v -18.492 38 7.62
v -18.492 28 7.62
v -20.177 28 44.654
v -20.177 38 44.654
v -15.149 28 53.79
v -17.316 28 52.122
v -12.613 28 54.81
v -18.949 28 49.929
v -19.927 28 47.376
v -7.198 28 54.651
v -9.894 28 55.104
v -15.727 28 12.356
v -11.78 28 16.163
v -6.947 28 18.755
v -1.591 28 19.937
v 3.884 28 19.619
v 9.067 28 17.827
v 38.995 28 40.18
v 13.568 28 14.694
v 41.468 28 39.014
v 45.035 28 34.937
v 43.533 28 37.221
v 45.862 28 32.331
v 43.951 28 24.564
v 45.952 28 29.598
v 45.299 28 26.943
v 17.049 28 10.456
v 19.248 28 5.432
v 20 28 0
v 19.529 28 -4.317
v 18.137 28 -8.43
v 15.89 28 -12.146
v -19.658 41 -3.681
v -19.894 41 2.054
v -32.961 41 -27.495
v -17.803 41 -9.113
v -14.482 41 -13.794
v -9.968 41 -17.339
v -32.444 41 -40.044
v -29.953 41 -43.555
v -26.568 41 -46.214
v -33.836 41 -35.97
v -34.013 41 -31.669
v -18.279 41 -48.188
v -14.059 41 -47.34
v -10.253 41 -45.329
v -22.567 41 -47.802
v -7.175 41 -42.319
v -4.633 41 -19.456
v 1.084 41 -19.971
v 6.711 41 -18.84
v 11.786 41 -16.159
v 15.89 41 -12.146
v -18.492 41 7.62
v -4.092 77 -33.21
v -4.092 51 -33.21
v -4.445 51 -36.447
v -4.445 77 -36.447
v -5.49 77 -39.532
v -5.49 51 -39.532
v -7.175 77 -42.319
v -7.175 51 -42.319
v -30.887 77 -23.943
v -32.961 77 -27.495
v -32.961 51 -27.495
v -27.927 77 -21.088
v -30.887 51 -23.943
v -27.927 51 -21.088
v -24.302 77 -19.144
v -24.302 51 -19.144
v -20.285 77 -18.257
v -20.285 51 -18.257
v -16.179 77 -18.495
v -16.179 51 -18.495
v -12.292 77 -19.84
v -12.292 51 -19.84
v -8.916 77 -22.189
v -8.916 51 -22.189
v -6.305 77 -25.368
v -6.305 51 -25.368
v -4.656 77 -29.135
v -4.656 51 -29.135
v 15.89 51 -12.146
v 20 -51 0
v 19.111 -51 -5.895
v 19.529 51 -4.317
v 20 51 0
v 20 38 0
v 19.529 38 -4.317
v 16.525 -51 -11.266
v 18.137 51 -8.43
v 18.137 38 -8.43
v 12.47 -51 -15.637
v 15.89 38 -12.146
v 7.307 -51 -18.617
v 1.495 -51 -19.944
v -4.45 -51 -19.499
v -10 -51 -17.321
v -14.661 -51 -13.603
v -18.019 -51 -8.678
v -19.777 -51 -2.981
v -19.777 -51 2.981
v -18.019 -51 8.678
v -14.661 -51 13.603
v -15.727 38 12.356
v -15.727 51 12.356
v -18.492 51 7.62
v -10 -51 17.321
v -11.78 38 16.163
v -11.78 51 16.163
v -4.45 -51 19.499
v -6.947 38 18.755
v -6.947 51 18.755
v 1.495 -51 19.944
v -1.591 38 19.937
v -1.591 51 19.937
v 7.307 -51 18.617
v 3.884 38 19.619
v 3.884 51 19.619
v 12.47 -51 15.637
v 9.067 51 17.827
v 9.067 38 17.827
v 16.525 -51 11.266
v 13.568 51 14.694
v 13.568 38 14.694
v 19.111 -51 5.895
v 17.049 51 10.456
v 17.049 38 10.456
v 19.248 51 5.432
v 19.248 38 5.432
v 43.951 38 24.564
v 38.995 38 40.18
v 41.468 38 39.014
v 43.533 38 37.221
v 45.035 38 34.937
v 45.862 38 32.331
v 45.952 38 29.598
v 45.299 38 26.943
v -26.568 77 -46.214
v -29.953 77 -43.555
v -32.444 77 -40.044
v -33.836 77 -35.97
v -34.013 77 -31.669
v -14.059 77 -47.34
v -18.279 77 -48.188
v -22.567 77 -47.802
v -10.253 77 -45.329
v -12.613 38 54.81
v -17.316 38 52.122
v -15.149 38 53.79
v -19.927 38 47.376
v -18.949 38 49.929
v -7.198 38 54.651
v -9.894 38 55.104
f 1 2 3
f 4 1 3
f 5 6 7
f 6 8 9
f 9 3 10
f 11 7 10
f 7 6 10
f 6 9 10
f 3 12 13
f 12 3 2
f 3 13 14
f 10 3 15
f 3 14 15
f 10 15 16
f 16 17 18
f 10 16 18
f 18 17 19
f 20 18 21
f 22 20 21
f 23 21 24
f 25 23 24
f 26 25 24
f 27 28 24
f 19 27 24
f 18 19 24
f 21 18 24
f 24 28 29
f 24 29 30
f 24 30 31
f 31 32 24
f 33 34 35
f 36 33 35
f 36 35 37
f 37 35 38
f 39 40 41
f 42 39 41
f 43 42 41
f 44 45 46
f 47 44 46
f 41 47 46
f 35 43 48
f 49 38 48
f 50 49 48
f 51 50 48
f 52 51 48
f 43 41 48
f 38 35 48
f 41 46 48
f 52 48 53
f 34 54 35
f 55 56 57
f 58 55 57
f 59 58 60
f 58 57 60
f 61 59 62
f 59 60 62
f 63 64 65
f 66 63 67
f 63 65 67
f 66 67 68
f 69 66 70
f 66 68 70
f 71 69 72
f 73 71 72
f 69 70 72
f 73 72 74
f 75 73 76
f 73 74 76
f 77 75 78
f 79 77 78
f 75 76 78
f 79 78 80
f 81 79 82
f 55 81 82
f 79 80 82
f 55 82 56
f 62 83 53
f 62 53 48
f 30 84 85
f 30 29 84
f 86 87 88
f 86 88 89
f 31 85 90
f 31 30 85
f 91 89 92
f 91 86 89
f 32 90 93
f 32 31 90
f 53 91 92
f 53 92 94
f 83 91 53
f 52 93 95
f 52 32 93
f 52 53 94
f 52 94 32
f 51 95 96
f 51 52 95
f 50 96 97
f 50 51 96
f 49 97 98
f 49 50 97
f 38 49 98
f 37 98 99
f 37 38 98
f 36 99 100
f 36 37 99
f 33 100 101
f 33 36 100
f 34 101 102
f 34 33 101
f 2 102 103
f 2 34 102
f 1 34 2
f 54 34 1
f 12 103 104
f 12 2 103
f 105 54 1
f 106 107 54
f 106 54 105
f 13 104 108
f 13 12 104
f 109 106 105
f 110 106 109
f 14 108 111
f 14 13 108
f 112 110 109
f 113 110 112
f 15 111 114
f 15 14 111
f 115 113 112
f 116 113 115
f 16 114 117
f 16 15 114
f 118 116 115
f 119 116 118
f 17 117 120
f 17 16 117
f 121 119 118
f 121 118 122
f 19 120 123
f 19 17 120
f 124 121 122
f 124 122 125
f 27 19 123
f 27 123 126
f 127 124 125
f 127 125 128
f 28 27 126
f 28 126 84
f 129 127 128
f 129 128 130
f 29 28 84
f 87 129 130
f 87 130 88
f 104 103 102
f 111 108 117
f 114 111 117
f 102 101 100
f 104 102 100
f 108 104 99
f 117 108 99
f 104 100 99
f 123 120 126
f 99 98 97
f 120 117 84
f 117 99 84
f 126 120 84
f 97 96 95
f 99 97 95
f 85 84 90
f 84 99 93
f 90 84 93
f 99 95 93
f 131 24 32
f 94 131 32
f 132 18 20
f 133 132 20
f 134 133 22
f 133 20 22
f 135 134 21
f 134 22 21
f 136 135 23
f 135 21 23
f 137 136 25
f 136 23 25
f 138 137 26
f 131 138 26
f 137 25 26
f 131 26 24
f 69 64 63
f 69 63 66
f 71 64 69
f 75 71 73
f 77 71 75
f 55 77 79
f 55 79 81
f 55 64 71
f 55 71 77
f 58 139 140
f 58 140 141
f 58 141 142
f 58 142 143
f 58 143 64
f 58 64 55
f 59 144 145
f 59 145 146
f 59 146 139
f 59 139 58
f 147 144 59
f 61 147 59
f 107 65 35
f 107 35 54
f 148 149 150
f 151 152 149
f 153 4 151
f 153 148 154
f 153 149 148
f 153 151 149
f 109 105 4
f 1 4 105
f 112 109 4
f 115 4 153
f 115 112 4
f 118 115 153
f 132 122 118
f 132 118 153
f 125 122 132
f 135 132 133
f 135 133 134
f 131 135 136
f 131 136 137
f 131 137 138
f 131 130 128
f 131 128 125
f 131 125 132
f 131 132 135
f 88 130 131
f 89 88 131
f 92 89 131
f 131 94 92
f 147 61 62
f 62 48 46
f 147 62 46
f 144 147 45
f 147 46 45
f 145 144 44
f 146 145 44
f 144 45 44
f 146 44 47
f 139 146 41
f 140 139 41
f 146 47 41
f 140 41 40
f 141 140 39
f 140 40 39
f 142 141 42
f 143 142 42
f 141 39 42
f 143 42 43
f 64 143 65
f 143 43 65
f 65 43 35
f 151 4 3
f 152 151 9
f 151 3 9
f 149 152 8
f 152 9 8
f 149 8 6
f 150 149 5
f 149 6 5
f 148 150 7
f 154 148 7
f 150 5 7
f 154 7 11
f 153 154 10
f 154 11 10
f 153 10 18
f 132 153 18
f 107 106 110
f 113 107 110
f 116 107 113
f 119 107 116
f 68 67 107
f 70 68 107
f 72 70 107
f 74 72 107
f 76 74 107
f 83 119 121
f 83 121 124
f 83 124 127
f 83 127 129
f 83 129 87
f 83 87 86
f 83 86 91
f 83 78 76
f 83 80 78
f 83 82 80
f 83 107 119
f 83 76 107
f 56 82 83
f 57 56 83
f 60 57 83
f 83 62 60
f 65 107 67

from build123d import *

# Parameters (mm, degrees)
SKETCH1_R           = 20
BOSS_EXTRUDE1_DEPTH = 51
BOSS_EXTRUDE2_DEPTH = 10
BOSS_EXTRUDE3_START = 26
BOSS_EXTRUDE3_DEPTH = 26
BOSS_EXTRUDE4_START = -10
BOSS_EXTRUDE4_DEPTH = 10


with BuildPart() as part:
    # Sketch1 → Boss-Extrude1 (new, symmetric)
    with BuildSketch(Plane(origin=(0, 0, 0), x_dir=(1, 0, 0), z_dir=(0, 1, 0))):
        Circle(SKETCH1_R)
    extrude(amount=BOSS_EXTRUDE1_DEPTH, both=True)

    # Sketch2 → Boss-Extrude2 (add)
    with BuildSketch(Plane(origin=(0, 51, 0), x_dir=(1, 0, 0), z_dir=(0, 1, 0))):
        with BuildLine():
            Line((15.889530325, 12.145897498), (-7.174782394, 42.319138828))
            ThreePointArc((-7.174782394, 42.319138828), (-26.567920967, 46.213928911), (-32.960703114, 27.495073445))
            Line((-32.960703114, 27.495073445), (-18.491697301, -7.619523011))
            ThreePointArc((-18.491697301, -7.619523011), (9.967987772, -17.338950942), (15.889530325, 12.145897498))
        make_face()
    extrude(amount=-BOSS_EXTRUDE2_DEPTH)

    # Sketch2<3> → Boss-Extrude3 (add)
    with BuildSketch(Plane(origin=(0, 51, 0), x_dir=(1, 0, 0), z_dir=(0, 1, 0)).offset(BOSS_EXTRUDE3_START)):
        with BuildLine():
            ThreePointArc((-4.091930138, 33.209715704), (-4.883530929, 38.018186554), (-7.174782394, 42.319138828))
            ThreePointArc((-7.174782394, 42.319138828), (-26.567920967, 46.213928911), (-32.960703114, 27.495073445))
            ThreePointArc((-32.960703114, 27.495073445), (-16.179164668, 18.495239929), (-4.091930138, 33.209715704))
        make_face()
    extrude(amount=-BOSS_EXTRUDE3_DEPTH)

    # Sketch3 → Boss-Extrude4 (add)
    with BuildSketch(Plane(origin=(0, 28, 0), x_dir=(-1, 0, 0), z_dir=(0, -1, 0)).offset(BOSS_EXTRUDE4_START)):
        with BuildLine():
            Line((18.491697301, -7.619523011), (20.177187538, -44.653612428))
            ThreePointArc((20.177187538, -44.653612428), (16.289787181, -53.030534966), (7.198092717, -54.650968393))
            Line((7.198092717, -54.650968393), (-38.995361437, -40.179987261))
            ThreePointArc((-38.995361437, -40.179987261), (-45.537524503, -33.661949585), (-43.950691193, -24.564330513))
            Line((-43.950691193, -24.564330513), (-15.889530325, 12.145897498))
            ThreePointArc((-15.889530325, 12.145897498), (-9.967987772, -17.338950942), (18.491697301, -7.619523011))
        make_face()
    extrude(amount=BOSS_EXTRUDE4_DEPTH)


solid = part.part
